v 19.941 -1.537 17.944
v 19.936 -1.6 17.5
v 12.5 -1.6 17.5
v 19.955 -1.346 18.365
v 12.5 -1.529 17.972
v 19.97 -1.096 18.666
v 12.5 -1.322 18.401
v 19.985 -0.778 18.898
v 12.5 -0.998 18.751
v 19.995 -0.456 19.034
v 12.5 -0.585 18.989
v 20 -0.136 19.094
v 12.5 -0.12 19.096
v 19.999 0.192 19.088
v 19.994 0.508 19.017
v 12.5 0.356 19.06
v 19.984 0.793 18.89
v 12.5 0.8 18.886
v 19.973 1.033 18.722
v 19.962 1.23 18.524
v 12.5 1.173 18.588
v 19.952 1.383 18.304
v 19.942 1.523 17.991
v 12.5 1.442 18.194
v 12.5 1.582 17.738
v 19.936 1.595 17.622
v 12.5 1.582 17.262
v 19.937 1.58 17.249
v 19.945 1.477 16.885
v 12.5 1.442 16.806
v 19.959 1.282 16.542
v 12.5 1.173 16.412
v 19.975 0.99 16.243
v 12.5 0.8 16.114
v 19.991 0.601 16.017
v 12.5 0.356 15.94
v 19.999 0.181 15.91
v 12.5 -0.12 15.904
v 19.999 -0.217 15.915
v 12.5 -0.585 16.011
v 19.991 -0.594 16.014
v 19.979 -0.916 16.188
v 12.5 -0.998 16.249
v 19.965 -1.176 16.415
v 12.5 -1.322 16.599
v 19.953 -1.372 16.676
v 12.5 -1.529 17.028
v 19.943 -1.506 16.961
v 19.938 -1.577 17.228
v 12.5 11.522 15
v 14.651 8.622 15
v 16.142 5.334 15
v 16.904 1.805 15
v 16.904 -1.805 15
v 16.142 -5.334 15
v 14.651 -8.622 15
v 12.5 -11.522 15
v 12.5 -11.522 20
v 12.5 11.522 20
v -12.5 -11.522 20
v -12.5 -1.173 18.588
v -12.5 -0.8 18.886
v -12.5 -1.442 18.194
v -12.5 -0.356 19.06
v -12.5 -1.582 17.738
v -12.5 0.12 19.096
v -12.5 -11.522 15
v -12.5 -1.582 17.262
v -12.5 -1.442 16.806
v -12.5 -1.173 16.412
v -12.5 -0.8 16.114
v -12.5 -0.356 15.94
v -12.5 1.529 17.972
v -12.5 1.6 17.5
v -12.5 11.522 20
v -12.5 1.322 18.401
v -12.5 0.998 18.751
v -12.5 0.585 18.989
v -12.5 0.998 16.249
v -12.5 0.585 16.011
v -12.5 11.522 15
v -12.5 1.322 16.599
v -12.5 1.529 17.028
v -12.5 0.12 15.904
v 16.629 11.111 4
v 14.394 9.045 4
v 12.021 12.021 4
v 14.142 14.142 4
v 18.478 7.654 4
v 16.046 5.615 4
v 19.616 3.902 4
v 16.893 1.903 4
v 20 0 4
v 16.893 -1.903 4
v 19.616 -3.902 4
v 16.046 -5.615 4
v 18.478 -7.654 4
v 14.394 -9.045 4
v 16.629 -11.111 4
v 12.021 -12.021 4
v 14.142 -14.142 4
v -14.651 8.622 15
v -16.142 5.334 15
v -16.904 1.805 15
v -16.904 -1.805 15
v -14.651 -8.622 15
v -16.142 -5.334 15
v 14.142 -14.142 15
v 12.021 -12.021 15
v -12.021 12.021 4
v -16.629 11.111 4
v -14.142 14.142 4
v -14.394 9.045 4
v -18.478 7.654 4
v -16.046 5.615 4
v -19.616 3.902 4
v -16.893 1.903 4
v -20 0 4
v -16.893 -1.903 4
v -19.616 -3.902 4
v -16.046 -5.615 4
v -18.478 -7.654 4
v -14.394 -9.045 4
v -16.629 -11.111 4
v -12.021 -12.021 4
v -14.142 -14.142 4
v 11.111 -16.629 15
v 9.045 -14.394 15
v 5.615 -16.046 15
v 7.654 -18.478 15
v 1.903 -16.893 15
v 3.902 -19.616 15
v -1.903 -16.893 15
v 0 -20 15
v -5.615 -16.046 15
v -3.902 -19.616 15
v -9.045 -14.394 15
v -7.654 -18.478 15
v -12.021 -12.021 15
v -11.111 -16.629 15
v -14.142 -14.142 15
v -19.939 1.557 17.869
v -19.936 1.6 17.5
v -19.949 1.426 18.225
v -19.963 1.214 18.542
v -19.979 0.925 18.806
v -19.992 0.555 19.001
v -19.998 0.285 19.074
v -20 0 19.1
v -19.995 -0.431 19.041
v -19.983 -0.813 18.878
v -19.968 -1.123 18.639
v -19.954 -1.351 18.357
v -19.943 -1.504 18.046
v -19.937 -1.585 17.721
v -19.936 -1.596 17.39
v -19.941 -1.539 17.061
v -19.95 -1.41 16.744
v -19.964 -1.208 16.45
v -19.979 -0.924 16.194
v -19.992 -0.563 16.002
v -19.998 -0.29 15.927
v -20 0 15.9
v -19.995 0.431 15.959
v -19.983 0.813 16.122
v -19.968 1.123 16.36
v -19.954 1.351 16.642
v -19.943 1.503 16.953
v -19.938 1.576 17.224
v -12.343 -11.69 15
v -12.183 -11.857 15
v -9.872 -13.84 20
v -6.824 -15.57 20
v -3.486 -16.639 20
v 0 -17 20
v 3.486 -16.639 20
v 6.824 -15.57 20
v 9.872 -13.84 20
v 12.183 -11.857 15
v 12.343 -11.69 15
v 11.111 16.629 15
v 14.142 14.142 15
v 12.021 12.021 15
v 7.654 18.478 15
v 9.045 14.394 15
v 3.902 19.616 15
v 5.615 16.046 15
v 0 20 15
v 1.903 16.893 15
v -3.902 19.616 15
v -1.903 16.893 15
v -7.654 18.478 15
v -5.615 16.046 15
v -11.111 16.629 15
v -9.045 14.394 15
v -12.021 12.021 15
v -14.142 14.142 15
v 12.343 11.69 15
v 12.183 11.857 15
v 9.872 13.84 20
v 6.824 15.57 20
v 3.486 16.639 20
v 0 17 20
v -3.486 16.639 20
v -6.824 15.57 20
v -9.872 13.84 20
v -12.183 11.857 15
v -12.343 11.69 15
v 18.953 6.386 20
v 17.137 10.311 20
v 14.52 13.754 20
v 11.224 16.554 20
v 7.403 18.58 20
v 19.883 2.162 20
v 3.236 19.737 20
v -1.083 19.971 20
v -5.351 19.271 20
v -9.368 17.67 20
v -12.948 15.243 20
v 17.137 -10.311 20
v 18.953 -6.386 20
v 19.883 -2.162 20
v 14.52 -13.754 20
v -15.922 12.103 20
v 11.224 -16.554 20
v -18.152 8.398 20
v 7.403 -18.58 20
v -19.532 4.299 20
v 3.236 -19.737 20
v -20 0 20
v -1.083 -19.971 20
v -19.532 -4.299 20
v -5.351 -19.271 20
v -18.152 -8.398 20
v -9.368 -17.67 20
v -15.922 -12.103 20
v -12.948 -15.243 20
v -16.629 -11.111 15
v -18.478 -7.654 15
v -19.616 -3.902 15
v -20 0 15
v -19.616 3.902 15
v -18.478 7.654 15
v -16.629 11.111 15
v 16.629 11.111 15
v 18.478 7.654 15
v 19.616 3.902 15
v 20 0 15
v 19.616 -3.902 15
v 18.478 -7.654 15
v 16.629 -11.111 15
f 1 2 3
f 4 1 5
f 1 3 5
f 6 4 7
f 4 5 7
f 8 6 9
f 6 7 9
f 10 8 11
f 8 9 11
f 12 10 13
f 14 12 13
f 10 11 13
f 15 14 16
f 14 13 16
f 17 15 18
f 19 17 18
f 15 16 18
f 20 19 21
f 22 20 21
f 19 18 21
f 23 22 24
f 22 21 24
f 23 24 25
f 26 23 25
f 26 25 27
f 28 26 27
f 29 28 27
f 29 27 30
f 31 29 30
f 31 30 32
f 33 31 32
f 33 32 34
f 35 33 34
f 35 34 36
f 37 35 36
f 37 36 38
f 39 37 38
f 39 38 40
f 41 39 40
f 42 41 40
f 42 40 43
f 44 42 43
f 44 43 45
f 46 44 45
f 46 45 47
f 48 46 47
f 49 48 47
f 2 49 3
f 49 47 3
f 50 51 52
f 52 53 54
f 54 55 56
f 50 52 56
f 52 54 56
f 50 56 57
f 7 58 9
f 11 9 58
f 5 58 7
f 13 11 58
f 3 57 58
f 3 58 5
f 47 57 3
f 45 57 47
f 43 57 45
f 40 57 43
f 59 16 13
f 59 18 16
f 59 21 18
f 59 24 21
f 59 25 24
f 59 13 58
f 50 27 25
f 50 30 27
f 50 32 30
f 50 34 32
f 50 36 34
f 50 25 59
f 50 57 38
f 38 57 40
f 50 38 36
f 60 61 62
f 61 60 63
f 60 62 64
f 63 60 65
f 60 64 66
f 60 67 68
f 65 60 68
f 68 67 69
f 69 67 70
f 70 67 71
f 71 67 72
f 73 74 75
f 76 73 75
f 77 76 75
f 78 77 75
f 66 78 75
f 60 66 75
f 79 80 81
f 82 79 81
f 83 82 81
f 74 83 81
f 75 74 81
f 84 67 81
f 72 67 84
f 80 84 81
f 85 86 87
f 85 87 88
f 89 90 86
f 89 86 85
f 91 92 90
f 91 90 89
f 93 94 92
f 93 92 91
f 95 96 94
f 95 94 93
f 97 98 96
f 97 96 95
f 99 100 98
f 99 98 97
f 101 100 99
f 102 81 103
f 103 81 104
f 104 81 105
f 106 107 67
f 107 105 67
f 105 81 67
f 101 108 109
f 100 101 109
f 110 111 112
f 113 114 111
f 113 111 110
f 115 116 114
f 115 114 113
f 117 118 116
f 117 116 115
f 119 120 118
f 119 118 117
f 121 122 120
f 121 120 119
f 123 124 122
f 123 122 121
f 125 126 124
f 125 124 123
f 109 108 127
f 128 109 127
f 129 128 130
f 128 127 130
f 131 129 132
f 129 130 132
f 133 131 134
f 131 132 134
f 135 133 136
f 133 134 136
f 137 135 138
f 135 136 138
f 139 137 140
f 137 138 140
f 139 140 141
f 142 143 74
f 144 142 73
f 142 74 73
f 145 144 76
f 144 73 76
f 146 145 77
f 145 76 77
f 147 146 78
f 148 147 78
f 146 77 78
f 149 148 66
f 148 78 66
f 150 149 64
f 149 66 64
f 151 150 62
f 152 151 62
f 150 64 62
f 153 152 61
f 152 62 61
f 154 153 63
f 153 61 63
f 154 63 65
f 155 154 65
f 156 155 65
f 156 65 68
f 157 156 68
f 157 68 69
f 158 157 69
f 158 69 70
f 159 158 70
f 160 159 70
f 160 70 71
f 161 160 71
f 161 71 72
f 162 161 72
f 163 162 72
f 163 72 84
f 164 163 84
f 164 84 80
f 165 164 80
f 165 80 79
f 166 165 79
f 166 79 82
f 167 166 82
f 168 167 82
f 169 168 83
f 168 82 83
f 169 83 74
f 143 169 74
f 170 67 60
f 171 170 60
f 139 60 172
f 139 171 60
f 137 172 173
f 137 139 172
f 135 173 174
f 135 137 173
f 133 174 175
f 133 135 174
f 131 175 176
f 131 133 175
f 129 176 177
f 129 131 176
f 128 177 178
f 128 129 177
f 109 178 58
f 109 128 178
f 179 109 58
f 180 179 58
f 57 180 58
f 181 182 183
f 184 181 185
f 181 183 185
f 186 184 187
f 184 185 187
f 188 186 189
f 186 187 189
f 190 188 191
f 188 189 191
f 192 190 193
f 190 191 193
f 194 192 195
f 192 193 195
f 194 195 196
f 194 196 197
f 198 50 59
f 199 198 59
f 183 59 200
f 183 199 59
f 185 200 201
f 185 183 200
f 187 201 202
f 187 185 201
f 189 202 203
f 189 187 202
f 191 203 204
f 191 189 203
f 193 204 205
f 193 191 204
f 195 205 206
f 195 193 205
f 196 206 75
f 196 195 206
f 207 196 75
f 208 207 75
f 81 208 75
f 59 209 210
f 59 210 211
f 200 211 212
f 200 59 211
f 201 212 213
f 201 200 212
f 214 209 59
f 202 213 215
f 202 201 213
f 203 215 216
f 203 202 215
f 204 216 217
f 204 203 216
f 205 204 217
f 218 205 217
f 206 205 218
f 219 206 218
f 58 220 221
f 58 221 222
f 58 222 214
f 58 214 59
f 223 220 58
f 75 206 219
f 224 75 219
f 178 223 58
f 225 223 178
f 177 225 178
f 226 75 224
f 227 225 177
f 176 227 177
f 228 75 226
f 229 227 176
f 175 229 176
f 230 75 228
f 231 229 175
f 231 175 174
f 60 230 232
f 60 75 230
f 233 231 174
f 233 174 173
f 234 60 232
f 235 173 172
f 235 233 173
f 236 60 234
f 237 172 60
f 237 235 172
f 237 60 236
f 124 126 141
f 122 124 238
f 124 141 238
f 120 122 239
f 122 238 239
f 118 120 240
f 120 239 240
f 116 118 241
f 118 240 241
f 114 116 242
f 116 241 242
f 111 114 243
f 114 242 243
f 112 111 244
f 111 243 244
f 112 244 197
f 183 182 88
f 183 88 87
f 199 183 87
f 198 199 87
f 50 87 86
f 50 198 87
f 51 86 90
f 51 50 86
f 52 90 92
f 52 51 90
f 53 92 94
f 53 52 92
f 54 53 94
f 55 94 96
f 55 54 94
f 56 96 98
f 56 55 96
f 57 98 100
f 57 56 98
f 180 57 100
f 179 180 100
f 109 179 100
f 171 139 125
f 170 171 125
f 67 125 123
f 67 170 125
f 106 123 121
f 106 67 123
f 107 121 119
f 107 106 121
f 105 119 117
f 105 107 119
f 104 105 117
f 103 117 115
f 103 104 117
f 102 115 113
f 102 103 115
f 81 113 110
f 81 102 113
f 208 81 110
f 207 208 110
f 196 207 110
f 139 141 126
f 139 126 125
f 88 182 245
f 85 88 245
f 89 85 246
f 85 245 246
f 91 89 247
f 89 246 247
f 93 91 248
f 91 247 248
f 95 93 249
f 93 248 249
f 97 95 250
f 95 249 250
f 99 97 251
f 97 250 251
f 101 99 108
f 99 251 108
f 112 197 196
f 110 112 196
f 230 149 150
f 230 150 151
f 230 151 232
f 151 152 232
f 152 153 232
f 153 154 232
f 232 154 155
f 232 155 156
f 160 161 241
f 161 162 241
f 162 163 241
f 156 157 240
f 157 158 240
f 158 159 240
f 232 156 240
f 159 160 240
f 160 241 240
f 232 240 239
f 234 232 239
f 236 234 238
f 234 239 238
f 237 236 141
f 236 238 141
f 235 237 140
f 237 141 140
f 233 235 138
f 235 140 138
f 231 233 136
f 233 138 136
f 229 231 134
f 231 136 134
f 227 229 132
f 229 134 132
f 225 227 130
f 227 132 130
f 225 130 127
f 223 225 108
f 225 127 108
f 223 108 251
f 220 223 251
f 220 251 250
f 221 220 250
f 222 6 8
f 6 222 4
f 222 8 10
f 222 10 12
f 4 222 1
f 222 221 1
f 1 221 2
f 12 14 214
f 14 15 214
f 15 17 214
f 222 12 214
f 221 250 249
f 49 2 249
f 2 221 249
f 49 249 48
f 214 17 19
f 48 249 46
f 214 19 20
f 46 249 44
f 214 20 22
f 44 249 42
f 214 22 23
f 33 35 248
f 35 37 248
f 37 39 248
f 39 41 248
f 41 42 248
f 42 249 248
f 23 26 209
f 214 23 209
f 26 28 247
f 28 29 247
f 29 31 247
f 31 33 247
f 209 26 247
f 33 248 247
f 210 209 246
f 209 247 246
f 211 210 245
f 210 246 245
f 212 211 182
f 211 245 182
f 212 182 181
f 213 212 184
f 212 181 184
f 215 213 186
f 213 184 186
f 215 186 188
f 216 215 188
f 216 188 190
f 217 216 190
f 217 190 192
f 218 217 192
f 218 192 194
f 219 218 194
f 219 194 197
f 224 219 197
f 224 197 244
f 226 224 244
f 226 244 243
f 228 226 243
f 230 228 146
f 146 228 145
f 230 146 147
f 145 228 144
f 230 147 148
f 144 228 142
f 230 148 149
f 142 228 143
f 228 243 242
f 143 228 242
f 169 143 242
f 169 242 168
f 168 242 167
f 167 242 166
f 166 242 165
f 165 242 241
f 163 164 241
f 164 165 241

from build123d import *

# Parameters (mm, degrees)
SKETCH044_R     = 20
PAD021_DEPTH    = 5
PAD022_DEPTH    = 11
SKETCH051_R     = 1.6
POCKET019_DEPTH = 7.501
SKETCH052_R     = 1.6
POCKET020_DEPTH = 7.501


with BuildPart() as part:
    # Sketch044 (on Face2 of Binder009) → Pad021 (new body)
    with BuildSketch(Plane(origin=(0, 0, 15), x_dir=(-1, 0, 0), z_dir=(0, 0, 1))):
        Circle(SKETCH044_R)
        with BuildLine():
            Line((12.5, 11.521719), (12.5, -11.521719))
            ThreePointArc((-12.5, -11.521719), (0, -17), (12.5, -11.521719))
            Line((-12.5, 11.521719), (-12.5, -11.521719))
            ThreePointArc((12.5, 11.521719), (0, 17), (-12.5, 11.521719))
        make_face(mode=Mode.SUBTRACT)
    extrude(amount=PAD021_DEPTH)

    # Sketch045 (on Face6 of Pad021) → Pad022 (join)
    with BuildSketch(Plane(origin=(0, 0, 15), x_dir=(1, 0, 0), z_dir=(0, 0, -1))):
        with BuildLine():
            ThreePointArc((-14.142136, 14.142136), (-20, 3e-06), (-14.14214, -14.142131))
            Line((-14.14214, -14.142131), (-12.020819, -12.020811))
            ThreePointArc((-12.020815, 12.020815), (-17, 3e-06), (-12.020819, -12.020811))
            Line((-14.142136, 14.142136), (-12.020815, 12.020815))
        make_face()
        with BuildLine():
            ThreePointArc((14.142136, -14.142136), (20, -3e-06), (14.14214, 14.142131))
            Line((14.14214, 14.142131), (12.020819, 12.020811))
            ThreePointArc((12.020815, -12.020815), (17, -3e-06), (12.020819, 12.020811))
            Line((14.142136, -14.142136), (12.020815, -12.020815))
        make_face()
    extrude(amount=PAD022_DEPTH)

    # Sketch051 (on Face2 of Pad021) → Pocket019 (cut, through all)
    with BuildSketch(Plane.YZ.offset(-12.5)):
        with Locations((0, 17.5)):
            Circle(SKETCH051_R)
    extrude(amount=-POCKET019_DEPTH, mode=Mode.SUBTRACT)

    # Sketch052 (on Face12 of Pocket019) → Pocket020 (cut, through all)
    with BuildSketch(Plane(origin=(12.5, 0, 0), x_dir=(0, -1, 0), z_dir=(-1, 0, 0))):
        with Locations((0, 17.5)):
            Circle(SKETCH052_R)
    extrude(amount=-POCKET020_DEPTH, mode=Mode.SUBTRACT)


solid = part.part
